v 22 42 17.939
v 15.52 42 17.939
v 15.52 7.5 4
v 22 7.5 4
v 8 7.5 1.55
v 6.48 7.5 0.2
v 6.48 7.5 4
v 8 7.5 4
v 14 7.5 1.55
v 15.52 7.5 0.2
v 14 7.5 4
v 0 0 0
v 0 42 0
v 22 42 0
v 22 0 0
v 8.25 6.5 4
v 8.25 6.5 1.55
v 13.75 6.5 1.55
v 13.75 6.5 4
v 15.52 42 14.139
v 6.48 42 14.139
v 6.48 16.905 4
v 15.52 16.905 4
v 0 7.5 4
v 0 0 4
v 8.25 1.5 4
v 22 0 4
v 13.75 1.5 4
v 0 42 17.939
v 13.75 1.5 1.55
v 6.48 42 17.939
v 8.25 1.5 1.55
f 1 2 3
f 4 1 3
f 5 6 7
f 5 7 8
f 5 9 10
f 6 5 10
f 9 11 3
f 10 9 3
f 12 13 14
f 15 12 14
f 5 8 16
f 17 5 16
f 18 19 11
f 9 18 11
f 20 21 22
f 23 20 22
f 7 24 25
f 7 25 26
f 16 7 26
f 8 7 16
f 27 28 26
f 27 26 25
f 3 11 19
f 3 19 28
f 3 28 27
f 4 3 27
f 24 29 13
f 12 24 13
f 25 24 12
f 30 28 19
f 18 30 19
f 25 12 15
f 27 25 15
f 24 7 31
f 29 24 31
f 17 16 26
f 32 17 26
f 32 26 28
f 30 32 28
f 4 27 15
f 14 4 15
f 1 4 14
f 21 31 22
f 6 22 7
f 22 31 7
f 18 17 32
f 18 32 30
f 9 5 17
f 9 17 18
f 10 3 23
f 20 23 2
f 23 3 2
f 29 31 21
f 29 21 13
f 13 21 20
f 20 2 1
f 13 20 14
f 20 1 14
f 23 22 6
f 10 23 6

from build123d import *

# Parameters (mm, degrees)
F0_W      = 22
F0_H      = 42
F1_DEPTH  = 4
F3_DEPTH  = 2.45
F5_DEPTH  = 3.8
F7_DEPTH  = 9.04
F9_DEPTH  = 6.48
F11_DEPTH = 6.48


with BuildPart() as f1:
    # F0 (on Top) → F1 (new body)
    with BuildSketch(Plane.XY):
        with Locations((11, 21)):
            Rectangle(F0_W, F0_H)
    extrude(amount=F1_DEPTH)

    # F2 (on face) → F3 (cut)
    with BuildSketch(Plane.XY.offset(4)):
        Polygon((8.25, 6.5), (8.25, 1.5), (13.75, 1.5), (13.75, 6.5), (14, 7.5), (8, 7.5), align=None)
    extrude(amount=-F3_DEPTH, mode=Mode.SUBTRACT)

    # F4 (on face) → F5 (cut)
    with BuildSketch(Plane.XY.offset(4)):
        Polygon((8, 7.5), (11, 7.5), (14, 7.5), (15.52, 7.5), (15.52, 42), (6.48, 42), (6.48, 7.5), align=None)
    extrude(amount=-F5_DEPTH, mode=Mode.SUBTRACT)

    # F6 (on face) → F7 (join)
    with BuildSketch(Plane.YZ.offset(6.48)):
        Polygon((42, 14.138905), (16.90533, 4), (42, 4), align=None)
        Polygon((16.90533, 4), (7.5, 0.2), (36.424737, 0.2), (42, 0.2), (42, 4), align=None)
    extrude(amount=F7_DEPTH)

    # F8 (on face) → F9 (join)
    with BuildSketch(Plane.YZ.offset(15.52)):
        Polygon((16.90533, 4), (42, 14.138905), (42, 17.938905), (7.5, 4), align=None)
        Polygon((42, 4), (42, 14.138905), (16.90533, 4), align=None)
    extrude(amount=F9_DEPTH)

    # F10 (on face) → F11 (join)
    with BuildSketch(Plane(origin=(6.48, 0, 0), x_dir=(0, -1, 0), z_dir=(-1, 0, 0))):
        Polygon((-42, 17.938905), (-42, 14.138905), (-16.90533, 4), (-7.5, 4), align=None)
        Polygon((-16.90533, 4), (-42, 14.138905), (-42, 4), align=None)
    extrude(amount=F11_DEPTH)


solid = f1.part
